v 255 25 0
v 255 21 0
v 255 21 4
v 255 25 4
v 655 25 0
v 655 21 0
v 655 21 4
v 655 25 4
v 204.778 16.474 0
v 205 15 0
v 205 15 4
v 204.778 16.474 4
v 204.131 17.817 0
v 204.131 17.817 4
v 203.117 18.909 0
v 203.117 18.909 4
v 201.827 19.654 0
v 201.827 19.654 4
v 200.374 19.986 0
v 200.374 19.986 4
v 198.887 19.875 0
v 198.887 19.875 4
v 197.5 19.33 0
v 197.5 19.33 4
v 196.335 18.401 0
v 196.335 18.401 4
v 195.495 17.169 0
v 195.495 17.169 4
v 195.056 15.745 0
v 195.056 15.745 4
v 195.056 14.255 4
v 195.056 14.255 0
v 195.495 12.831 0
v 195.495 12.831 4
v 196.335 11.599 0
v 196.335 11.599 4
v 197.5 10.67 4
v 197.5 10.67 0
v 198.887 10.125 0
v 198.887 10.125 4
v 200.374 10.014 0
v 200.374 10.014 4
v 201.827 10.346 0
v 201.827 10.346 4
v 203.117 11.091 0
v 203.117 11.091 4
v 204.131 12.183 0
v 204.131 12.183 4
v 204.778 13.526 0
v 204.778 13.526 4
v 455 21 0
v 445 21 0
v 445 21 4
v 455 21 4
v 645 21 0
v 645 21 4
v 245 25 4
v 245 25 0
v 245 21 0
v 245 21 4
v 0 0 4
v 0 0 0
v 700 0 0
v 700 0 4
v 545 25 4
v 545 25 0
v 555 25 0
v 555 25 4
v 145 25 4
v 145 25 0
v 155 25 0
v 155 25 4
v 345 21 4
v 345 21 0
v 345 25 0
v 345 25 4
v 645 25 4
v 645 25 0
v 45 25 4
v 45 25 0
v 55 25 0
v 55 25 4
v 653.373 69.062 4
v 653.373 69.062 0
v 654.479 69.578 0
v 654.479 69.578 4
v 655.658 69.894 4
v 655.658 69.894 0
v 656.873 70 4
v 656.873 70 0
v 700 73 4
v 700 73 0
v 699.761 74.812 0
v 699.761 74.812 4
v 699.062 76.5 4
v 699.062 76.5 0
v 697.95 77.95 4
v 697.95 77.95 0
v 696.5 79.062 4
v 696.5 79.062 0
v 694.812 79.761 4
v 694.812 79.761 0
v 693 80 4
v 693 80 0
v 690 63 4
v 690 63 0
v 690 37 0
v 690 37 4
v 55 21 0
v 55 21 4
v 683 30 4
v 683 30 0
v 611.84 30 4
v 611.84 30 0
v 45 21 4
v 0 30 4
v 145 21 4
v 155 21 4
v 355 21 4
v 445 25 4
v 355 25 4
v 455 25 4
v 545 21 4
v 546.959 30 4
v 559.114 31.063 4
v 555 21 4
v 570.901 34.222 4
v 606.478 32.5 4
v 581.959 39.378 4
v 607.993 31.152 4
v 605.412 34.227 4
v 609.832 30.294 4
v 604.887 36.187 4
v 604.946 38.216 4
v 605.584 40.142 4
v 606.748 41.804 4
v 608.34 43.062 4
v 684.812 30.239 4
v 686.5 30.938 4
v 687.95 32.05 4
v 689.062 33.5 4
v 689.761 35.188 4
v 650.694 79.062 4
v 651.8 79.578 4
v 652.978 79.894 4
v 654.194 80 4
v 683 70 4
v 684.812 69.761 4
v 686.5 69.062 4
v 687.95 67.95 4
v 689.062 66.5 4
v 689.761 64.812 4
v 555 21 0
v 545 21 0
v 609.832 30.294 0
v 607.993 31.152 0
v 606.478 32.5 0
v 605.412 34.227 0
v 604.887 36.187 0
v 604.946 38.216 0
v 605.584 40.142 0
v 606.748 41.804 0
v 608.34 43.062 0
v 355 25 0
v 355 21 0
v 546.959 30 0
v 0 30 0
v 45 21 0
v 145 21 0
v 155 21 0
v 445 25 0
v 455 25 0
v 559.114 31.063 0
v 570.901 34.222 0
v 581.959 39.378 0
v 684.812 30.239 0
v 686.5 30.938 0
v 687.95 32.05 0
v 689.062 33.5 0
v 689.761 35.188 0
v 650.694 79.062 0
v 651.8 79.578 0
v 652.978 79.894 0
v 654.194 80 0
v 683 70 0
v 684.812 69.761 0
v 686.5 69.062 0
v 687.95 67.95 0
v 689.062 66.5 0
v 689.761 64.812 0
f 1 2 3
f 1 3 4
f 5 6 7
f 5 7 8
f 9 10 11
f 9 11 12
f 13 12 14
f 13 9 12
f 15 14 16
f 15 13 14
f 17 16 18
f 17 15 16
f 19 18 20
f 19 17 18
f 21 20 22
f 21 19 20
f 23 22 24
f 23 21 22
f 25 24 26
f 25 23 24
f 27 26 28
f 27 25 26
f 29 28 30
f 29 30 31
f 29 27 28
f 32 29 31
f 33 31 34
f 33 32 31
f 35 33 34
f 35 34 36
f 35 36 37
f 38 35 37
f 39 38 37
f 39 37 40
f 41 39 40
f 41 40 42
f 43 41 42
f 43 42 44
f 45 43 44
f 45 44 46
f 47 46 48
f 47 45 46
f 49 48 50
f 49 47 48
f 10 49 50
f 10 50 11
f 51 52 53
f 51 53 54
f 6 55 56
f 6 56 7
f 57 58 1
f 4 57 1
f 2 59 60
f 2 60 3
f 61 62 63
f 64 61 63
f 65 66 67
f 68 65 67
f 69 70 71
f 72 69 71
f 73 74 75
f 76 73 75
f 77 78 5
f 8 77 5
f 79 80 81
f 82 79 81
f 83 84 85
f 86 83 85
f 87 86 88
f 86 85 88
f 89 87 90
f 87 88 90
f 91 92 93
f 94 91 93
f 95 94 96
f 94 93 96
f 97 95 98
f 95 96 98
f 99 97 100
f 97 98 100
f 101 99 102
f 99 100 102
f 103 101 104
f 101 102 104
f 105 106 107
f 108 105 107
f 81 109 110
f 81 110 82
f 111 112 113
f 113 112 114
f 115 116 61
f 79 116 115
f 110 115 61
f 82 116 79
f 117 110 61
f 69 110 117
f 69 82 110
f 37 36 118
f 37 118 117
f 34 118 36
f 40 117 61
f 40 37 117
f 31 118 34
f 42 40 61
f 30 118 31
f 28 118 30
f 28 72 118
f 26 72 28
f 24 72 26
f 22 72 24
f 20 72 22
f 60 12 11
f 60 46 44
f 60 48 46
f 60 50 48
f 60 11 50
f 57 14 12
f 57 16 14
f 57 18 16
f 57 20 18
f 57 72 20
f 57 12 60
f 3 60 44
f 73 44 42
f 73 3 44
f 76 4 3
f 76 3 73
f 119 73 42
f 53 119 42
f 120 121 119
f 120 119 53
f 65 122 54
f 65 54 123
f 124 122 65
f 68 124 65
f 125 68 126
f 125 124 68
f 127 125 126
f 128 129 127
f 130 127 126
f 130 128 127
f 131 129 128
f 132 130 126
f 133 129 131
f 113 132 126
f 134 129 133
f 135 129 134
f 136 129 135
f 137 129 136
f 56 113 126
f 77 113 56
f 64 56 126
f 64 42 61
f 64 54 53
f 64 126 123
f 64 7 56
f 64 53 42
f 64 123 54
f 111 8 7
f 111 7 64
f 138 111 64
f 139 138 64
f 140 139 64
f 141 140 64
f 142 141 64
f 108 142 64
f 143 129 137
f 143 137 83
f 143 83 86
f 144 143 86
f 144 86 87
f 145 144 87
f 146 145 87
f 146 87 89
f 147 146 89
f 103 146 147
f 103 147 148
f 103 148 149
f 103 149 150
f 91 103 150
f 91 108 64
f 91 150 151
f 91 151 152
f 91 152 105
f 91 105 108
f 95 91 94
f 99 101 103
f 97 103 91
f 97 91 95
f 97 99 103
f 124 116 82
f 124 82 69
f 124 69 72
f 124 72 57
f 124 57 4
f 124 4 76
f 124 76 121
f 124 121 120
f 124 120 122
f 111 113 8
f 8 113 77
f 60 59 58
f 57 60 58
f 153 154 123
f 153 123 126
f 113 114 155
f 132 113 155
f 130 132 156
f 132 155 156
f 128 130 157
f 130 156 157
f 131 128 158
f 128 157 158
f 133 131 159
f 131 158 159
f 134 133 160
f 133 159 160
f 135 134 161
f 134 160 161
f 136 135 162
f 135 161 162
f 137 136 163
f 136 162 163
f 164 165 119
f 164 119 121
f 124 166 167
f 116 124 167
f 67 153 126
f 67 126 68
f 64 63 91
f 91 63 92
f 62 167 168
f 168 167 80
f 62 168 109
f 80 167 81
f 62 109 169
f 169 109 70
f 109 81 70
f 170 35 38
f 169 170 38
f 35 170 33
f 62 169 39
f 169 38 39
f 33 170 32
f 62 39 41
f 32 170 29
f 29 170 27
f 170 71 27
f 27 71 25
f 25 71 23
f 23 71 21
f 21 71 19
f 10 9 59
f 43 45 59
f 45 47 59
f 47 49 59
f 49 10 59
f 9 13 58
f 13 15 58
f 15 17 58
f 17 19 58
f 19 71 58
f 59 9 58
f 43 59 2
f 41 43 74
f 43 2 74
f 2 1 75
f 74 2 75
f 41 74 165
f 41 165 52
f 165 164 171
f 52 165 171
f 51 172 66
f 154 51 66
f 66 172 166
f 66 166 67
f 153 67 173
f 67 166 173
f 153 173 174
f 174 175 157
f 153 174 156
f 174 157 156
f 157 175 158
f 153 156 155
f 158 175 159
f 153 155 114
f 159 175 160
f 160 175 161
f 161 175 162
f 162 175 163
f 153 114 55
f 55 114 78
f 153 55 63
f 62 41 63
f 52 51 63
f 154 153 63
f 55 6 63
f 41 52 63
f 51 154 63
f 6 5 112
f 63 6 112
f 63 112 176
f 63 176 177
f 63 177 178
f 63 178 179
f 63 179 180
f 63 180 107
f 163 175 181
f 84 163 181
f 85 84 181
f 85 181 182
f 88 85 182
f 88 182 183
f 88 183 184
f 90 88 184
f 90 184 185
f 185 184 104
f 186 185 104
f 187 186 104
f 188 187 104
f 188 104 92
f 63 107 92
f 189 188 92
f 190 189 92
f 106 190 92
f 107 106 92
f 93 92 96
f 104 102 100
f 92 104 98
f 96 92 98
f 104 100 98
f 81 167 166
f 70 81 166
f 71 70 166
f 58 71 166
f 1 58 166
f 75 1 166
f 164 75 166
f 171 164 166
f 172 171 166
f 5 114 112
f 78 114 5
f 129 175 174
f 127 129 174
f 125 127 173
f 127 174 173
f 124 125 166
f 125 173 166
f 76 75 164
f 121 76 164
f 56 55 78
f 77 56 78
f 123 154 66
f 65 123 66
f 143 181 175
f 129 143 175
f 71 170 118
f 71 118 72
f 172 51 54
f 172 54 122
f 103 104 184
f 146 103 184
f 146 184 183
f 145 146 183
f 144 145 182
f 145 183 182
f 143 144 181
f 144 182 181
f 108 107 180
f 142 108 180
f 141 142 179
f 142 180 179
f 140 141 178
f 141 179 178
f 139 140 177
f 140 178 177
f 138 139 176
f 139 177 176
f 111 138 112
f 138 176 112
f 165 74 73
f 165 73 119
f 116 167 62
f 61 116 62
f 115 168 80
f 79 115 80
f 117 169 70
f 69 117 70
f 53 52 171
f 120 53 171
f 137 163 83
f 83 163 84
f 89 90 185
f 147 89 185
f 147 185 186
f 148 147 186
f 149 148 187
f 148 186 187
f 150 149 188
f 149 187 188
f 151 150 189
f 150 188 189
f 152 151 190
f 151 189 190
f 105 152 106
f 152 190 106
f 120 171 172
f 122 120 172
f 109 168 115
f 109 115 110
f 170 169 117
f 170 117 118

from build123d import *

# Parameters (mm, degrees)
SCHIZZO1_R                   = 5
SCHIZZO1_W                   = 10
SCHIZZO1_H                   = 4
ESTRUSIONE_ESTRUSIONE3_DEPTH = 4


with BuildPart() as part:
    # Schizzo1 → Estrusione-Estrusione3 (new body)
    with BuildSketch(Plane.XY):
        with BuildLine():
            Line((0, 0), (700, 0))
            Line((700, 0), (700, 30))
            Line((700, 30), (700, 73))
            ThreePointArc((700, 73), (697.949747468, 77.949747468), (693, 80))
            Line((693, 80), (654.193736081, 80))
            ThreePointArc((654.193736081, 80), (652.382002765, 79.761480784), (650.693736081, 79.062177826))
            Line((650.693736081, 79.062177826), (581.959107885, 39.378221735))
            ThreePointArc((581.959107885, 39.378221735), (565.076441043, 32.38519216), (546.959107885, 30))
            Line((546.959107885, 30), (0, 30))
            Line((0, 30), (0, 0))
        make_face()
        with Locations((200, 15)):
            Circle(SCHIZZO1_R, mode=Mode.SUBTRACT)
        with Locations((150, 23)):
            Rectangle(SCHIZZO1_W, SCHIZZO1_H, mode=Mode.SUBTRACT)
        with Locations((50, 23)):
            Rectangle(SCHIZZO1_W, SCHIZZO1_H, mode=Mode.SUBTRACT)
        with Locations((250, 23)):
            Rectangle(SCHIZZO1_W, SCHIZZO1_H, mode=Mode.SUBTRACT)
        with Locations((350, 23)):
            Rectangle(SCHIZZO1_W, SCHIZZO1_H, mode=Mode.SUBTRACT)
        with Locations((450, 23)):
            Rectangle(SCHIZZO1_W, SCHIZZO1_H, mode=Mode.SUBTRACT)
        with Locations((550, 23)):
            Rectangle(SCHIZZO1_W, SCHIZZO1_H, mode=Mode.SUBTRACT)
        with Locations((650, 23)):
            Rectangle(SCHIZZO1_W, SCHIZZO1_H, mode=Mode.SUBTRACT)
        with BuildLine():
            Line((690, 63), (690, 37))
            ThreePointArc((690, 37), (687.949747468, 32.050252532), (683, 30))
            Line((683, 30), (611.839907009, 30))
            ThreePointArc((611.839907009, 30), (605.078426225, 35.188266684), (608.339907009, 43.062177826))
            Line((608.339907009, 43.062177826), (653.373228005, 69.062177826))
            ThreePointArc((653.373228005, 69.062177826), (655.06149469, 69.761480784), (656.873228005, 70))
            Line((656.873228005, 70), (683, 70))
            ThreePointArc((683, 70), (687.949747468, 67.949747468), (690, 63))
        make_face(mode=Mode.SUBTRACT)
    extrude(amount=ESTRUSIONE_ESTRUSIONE3_DEPTH)


solid = part.part
